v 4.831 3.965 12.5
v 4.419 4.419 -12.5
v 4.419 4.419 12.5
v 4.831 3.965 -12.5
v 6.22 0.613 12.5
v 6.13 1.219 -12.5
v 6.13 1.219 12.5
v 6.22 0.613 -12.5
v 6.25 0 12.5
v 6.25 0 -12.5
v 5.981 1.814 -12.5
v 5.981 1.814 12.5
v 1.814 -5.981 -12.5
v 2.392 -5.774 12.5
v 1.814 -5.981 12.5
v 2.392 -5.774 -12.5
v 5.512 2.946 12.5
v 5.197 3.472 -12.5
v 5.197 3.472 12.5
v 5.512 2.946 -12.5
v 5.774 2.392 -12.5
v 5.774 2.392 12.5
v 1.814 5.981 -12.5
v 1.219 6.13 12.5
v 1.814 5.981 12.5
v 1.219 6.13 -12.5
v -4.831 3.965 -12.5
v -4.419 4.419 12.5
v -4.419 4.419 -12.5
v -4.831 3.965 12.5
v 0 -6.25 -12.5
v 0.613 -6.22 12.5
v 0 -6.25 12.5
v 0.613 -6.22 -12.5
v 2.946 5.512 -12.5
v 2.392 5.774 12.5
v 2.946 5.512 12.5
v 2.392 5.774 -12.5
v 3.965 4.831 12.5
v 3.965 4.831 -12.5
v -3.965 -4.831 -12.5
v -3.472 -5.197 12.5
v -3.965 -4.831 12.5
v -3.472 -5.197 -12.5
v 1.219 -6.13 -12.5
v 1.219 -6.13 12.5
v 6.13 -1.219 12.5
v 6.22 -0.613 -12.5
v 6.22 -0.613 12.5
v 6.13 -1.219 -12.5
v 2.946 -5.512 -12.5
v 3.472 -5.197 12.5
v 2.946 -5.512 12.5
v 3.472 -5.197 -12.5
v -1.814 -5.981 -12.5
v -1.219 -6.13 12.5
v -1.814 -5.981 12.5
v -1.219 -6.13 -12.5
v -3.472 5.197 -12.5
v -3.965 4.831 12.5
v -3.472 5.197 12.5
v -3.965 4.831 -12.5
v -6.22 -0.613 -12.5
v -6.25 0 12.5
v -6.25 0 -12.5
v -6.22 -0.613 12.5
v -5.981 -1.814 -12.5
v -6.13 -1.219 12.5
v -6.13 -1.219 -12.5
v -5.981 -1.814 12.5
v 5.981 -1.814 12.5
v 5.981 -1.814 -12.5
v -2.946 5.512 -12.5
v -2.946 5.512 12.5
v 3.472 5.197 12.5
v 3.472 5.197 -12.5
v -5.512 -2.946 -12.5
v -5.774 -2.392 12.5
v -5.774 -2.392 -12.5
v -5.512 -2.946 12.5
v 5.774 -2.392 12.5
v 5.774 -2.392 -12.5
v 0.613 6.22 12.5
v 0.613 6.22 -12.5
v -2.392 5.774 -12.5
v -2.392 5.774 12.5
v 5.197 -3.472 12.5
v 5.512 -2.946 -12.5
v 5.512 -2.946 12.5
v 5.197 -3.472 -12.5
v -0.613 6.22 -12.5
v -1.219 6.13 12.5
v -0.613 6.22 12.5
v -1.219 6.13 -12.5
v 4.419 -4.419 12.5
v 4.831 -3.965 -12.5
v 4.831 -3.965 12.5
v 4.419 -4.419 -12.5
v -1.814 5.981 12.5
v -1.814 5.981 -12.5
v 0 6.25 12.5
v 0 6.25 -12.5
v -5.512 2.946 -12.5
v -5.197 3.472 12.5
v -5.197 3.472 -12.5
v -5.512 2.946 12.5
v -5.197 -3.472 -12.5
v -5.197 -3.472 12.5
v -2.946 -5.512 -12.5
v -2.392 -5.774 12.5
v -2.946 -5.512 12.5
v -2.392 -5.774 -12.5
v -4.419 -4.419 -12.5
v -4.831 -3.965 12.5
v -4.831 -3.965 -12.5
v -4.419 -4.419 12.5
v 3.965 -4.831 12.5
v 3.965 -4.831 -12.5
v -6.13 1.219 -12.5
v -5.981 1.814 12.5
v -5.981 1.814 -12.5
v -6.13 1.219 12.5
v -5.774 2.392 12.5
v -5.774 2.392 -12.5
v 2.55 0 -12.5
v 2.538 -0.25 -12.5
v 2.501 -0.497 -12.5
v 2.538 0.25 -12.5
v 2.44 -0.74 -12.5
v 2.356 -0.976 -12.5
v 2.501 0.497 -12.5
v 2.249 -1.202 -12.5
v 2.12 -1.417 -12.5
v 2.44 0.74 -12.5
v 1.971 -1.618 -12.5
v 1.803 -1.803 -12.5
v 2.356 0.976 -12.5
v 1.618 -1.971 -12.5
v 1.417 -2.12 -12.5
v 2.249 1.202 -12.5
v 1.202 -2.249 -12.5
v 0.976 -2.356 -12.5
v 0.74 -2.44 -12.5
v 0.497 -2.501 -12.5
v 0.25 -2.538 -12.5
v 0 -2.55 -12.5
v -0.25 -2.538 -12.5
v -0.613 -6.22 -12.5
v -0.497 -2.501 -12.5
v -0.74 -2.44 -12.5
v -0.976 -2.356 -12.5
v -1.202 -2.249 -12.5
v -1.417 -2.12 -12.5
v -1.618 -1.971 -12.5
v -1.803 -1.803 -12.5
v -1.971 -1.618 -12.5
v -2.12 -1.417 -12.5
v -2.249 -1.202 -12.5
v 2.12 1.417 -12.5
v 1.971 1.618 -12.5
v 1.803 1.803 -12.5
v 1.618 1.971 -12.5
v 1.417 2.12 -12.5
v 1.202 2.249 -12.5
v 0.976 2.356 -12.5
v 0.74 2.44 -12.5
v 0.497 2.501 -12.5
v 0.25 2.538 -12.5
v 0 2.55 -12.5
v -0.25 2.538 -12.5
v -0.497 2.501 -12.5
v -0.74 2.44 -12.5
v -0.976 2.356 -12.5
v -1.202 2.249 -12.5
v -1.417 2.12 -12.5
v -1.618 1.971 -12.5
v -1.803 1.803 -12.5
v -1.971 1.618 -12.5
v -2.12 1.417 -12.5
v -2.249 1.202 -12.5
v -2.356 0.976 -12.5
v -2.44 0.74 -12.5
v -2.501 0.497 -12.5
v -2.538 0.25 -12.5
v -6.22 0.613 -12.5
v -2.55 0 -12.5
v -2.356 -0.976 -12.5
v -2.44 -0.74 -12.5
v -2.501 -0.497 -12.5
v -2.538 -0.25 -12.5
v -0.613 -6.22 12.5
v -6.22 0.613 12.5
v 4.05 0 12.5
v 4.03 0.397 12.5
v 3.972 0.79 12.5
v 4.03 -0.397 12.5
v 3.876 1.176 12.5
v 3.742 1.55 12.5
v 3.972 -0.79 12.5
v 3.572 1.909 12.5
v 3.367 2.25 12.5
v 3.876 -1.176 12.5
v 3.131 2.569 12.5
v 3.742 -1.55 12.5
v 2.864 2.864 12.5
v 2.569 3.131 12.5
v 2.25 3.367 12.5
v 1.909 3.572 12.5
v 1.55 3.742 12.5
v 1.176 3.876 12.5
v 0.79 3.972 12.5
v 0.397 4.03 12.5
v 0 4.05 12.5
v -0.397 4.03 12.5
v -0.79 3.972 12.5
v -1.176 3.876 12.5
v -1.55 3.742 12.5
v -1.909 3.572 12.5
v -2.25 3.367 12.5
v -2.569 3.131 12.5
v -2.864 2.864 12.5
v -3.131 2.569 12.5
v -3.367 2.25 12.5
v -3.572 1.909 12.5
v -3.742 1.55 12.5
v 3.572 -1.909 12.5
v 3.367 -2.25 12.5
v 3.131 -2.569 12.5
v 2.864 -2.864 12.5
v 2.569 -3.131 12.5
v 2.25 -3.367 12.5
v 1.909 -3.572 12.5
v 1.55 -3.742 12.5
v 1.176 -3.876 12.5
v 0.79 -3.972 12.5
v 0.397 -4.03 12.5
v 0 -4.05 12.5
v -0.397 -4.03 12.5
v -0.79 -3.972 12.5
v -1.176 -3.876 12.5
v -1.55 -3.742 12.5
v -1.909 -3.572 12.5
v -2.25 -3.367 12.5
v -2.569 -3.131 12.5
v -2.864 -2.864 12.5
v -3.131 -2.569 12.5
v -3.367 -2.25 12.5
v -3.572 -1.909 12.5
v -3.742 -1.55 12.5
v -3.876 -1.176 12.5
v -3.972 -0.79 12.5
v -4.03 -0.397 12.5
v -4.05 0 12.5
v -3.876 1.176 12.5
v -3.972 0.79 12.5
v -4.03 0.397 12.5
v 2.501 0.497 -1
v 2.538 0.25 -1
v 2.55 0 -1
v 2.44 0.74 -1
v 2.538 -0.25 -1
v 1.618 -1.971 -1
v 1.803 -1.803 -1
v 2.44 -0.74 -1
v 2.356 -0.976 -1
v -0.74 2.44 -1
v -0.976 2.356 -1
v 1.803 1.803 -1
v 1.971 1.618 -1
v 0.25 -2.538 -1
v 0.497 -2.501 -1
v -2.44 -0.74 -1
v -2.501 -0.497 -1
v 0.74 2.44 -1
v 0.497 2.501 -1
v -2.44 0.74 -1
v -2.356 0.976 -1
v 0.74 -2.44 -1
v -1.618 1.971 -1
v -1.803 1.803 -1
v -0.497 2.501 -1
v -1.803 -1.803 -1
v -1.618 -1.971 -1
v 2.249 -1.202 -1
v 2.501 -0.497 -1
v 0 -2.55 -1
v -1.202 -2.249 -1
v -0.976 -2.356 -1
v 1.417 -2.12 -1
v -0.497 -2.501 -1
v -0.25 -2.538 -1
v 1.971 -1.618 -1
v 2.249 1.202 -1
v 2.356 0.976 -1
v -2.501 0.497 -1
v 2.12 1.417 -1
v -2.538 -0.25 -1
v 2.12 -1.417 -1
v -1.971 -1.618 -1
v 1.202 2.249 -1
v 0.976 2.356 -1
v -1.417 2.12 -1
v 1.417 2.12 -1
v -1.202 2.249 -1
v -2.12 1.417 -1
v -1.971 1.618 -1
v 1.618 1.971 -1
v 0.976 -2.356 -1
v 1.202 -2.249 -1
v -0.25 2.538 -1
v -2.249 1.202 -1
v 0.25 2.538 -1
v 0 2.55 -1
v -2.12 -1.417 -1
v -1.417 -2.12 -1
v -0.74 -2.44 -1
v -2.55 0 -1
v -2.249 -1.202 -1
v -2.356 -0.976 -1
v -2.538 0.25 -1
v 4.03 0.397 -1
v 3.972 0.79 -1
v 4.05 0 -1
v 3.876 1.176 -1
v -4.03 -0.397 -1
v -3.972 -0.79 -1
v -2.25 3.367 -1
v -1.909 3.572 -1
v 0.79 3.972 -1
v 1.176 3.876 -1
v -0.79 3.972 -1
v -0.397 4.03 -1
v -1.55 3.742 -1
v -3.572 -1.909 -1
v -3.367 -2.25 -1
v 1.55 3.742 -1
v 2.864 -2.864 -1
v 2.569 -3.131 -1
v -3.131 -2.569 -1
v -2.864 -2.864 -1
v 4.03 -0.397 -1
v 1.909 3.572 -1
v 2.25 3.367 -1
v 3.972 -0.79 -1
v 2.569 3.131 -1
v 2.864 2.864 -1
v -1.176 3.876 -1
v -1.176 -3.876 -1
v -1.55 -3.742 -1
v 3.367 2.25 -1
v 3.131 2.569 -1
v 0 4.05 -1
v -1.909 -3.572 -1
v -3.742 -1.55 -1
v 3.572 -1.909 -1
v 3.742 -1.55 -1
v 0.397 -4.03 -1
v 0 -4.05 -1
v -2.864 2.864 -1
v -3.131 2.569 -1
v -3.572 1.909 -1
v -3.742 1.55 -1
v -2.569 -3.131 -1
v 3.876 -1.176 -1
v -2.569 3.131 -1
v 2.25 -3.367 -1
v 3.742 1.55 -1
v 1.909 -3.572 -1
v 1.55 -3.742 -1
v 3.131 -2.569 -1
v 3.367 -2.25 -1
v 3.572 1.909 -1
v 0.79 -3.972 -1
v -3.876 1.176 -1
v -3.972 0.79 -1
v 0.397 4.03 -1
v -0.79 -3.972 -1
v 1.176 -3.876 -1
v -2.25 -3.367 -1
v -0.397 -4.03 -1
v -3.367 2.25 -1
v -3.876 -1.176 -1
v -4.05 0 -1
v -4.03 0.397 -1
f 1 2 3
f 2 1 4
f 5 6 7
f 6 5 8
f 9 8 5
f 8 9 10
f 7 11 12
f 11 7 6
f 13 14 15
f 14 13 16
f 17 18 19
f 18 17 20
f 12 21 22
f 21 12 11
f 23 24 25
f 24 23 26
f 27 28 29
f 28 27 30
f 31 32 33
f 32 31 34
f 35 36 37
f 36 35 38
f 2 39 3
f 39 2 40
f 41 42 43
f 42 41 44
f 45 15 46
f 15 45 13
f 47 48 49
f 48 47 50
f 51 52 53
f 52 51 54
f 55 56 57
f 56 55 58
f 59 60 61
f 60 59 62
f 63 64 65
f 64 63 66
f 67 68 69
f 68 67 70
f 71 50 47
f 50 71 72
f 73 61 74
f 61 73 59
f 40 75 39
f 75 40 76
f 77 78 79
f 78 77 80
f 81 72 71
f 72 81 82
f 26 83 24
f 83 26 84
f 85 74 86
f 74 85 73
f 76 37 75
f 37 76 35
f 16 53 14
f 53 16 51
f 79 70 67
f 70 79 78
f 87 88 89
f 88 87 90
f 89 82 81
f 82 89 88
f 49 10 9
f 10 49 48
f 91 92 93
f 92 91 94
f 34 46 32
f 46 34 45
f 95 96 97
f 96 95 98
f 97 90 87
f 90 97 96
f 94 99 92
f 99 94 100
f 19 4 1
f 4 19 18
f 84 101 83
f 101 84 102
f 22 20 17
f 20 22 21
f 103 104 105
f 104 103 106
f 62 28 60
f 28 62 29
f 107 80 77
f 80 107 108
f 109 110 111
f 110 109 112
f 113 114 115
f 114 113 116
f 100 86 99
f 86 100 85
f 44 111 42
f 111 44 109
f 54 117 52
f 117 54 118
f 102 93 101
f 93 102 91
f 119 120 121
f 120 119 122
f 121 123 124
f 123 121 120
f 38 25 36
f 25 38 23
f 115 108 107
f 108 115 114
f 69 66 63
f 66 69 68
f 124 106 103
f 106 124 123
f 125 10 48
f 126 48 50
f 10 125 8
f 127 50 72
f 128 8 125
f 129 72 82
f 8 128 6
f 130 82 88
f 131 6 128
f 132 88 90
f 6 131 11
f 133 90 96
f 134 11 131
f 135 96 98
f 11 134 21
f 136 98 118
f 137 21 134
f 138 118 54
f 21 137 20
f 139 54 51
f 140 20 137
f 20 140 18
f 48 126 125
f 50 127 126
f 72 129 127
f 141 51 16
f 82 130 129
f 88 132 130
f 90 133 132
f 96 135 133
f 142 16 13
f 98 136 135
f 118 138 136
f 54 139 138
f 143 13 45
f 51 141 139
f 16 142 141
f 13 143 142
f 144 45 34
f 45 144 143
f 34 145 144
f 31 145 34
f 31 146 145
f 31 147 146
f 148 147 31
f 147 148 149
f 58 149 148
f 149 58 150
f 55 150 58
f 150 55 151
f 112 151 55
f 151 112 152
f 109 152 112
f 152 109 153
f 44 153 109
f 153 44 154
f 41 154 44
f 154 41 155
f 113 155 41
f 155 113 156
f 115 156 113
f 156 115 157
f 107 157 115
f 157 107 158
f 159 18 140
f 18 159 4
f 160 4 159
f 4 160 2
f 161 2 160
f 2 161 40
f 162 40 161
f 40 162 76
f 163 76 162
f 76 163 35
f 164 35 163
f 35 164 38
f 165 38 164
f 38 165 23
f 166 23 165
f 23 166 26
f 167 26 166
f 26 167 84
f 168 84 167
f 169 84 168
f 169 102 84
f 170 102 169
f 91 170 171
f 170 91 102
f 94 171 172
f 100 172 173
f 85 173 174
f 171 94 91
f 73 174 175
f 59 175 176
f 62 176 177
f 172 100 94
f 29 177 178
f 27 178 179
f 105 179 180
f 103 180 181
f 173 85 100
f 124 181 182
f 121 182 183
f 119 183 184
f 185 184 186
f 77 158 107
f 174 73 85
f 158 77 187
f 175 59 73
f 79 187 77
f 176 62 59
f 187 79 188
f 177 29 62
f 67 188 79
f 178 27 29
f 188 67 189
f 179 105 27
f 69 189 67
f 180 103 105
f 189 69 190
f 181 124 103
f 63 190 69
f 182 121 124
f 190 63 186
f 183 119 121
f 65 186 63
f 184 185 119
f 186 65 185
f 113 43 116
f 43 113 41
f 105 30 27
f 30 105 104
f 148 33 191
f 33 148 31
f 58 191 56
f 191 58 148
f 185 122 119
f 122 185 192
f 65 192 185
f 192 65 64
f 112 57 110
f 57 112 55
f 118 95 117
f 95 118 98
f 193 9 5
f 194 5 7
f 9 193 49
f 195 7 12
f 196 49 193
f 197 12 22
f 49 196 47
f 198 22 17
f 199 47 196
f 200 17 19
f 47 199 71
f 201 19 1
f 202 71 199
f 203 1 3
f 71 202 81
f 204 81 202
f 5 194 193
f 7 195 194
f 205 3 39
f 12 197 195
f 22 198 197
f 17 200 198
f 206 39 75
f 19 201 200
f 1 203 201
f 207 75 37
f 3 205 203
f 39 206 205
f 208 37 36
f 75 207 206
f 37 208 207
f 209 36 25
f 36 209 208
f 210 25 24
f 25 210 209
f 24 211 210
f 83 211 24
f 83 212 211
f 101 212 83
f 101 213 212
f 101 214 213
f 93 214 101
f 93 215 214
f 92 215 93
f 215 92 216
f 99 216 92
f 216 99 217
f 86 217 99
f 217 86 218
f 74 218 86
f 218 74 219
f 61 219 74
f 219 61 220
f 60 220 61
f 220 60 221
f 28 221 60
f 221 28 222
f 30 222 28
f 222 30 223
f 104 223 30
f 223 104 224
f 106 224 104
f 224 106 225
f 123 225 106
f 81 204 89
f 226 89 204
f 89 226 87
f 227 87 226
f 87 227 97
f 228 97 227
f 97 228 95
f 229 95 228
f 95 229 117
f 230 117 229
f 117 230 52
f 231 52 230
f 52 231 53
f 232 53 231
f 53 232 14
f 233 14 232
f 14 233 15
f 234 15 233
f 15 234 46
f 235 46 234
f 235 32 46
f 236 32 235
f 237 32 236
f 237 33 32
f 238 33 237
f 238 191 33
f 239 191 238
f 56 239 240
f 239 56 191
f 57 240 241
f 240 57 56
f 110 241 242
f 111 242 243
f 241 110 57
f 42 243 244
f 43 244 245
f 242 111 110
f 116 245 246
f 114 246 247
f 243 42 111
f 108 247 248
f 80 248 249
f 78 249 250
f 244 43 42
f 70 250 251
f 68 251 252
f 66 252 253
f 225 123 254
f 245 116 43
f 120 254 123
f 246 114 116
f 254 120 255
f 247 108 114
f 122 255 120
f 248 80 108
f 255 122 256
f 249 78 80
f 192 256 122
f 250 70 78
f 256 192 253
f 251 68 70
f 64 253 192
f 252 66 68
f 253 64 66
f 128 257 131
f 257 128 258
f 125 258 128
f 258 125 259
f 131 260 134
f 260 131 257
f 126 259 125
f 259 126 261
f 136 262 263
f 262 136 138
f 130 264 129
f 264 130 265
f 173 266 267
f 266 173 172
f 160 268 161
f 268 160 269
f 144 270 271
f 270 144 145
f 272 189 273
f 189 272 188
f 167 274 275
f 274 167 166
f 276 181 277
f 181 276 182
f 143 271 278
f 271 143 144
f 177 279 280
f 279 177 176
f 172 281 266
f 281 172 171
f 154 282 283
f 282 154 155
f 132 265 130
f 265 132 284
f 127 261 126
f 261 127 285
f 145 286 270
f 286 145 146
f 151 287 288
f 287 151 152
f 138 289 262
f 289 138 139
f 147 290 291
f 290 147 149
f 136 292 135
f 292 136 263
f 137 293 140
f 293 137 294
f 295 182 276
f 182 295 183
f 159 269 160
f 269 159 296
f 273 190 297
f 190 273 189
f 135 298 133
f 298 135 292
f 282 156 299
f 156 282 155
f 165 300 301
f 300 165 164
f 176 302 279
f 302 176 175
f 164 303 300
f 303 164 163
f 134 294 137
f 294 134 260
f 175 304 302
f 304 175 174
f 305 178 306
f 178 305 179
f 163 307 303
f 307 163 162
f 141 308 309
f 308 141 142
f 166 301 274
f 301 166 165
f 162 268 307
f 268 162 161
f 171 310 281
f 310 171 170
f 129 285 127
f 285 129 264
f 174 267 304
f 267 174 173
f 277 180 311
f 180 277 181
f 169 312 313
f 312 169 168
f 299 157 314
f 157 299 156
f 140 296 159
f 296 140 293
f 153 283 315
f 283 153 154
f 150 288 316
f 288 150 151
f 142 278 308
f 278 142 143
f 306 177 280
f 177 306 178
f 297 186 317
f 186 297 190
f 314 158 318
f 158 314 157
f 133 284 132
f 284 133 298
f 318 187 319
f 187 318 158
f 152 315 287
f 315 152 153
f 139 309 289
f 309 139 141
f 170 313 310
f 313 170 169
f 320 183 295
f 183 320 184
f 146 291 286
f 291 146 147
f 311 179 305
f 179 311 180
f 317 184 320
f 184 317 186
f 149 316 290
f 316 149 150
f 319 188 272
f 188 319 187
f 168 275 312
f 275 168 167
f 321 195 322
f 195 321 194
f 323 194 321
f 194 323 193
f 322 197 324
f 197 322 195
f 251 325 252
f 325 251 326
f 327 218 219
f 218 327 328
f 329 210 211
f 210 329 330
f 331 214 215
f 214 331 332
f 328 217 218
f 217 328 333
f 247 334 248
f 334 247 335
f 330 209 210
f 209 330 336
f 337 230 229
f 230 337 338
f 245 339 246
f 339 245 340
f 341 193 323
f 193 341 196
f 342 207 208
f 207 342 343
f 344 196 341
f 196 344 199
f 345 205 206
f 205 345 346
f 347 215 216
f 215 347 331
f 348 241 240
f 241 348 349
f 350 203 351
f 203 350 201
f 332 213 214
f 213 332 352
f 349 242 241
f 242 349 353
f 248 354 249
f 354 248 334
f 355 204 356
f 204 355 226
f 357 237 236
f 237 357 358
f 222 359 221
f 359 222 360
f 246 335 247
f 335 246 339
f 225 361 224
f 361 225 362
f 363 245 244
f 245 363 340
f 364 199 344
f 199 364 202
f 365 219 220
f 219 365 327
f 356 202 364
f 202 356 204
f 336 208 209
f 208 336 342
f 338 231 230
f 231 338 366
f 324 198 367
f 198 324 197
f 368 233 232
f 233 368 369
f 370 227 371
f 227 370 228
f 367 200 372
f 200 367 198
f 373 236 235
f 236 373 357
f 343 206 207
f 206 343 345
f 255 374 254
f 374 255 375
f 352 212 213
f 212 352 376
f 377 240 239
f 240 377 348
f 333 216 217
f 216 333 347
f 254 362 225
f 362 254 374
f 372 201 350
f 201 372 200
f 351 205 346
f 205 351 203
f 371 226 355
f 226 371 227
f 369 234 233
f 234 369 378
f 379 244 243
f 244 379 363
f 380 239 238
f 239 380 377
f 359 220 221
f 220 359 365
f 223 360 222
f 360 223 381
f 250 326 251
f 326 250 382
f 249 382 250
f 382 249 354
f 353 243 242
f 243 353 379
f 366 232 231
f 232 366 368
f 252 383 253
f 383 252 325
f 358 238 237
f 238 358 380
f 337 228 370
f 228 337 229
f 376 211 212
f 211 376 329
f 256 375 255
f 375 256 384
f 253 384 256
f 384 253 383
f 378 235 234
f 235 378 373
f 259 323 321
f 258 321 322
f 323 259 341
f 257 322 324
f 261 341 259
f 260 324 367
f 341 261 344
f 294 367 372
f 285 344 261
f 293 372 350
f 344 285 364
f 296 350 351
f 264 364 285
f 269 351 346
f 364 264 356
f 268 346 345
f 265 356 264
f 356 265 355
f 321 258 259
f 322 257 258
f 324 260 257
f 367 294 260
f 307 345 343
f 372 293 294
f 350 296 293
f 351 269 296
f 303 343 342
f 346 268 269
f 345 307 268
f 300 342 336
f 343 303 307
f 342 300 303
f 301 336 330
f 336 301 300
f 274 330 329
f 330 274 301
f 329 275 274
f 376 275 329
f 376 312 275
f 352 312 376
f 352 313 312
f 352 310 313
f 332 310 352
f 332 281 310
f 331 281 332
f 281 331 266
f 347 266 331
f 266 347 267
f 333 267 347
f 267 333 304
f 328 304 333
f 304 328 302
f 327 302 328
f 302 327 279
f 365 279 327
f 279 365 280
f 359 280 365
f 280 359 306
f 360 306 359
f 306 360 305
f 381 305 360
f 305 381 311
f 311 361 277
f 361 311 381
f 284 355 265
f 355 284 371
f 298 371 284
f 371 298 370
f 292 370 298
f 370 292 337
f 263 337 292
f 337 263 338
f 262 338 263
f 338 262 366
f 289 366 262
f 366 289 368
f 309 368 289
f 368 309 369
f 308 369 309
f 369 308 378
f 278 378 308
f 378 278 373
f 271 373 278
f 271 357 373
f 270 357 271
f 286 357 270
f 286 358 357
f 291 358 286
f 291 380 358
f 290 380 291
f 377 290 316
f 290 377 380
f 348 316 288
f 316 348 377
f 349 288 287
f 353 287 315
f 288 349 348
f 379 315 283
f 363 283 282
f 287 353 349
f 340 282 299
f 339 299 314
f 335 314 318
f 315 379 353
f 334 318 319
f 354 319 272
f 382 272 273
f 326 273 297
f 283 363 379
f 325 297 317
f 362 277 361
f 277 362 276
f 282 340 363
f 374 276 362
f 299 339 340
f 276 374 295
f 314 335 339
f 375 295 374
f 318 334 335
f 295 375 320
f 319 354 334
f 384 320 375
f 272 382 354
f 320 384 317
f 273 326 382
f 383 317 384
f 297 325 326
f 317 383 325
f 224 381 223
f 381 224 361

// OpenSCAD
// Parameters
outer_diameter_mm = 12.5; //[6.25:25:0.1]
length_mm = 25; //[12.5:50:0.1]
bore1_diameter_mm = 5; //[2.5:10:0.05]
bore2_diameter_mm = 8; //[4:16:0.05]
bore_split_position_mm_from_end = 12.5; //[6.25:18.75:0.1]
tolerance_mm = 0.1; //[0:0.5:0.01]
set_screw_count_per_side = 0; //[0:4:1]
set_screw_hole_diameter_mm = 3; //[2:6:0.1]
set_screw_hole_depth_mm = 7; //[3:15:0.1]
set_screw_edge_offset_z_mm = 5; //[2:10:0.1]
overlap_mm = 1; //[0.5:2:0.1]

// Shaft Coupling - complete geometry
module shaft_coupling() {
  color("Silver") {
    difference() {
      // Coupling body
      translate([0, 0, 0])
        cylinder(r=outer_diameter_mm/2, h=length_mm, center=true, $fn=64);
      
      // Bore 5mm half
      translate([0, 0, -length_mm/2 + (bore_split_position_mm_from_end + overlap_mm)/2])
        cylinder(r=(bore1_diameter_mm + tolerance_mm)/2, h=bore_split_position_mm_from_end + overlap_mm, center=true, $fn=64);
      
      // Bore 8mm half
      translate([0, 0, -length_mm/2 + bore_split_position_mm_from_end + ((length_mm - bore_split_position_mm_from_end) + overlap_mm)/2 - overlap_mm])
        cylinder(r=(bore2_diameter_mm + tolerance_mm)/2, h=(length_mm - bore_split_position_mm_from_end) + overlap_mm, center=true, $fn=64);
      
      // Mid-plane bore transition
      translate([0, 0, -length_mm/2 + bore_split_position_mm_from_end])
        cylinder(r=(max(bore1_diameter_mm, bore2_diameter_mm) + tolerance_mm)/2, h=overlap_mm, center=true, $fn=64);
      
      // Set screw holes (optional)
      if (set_screw_count_per_side > 0) {
        union() {
          // Side 1
          for (i = [0 : set_screw_count_per_side - 1]) {
            rotate([0, 0, i * 360 / set_screw_count_per_side]) {
              translate([outer_diameter_mm/2 - set_screw_hole_depth_mm/2 + overlap_mm/2, 0, -length_mm/2 + set_screw_edge_offset_z_mm])
                rotate([0, 90, 0])
                cylinder(r=set_screw_hole_diameter_mm/2, h=set_screw_hole_depth_mm, center=true, $fn=32);
              
              translate([0, outer_diameter_mm/2 - set_screw_hole_depth_mm/2 + overlap_mm/2, -length_mm/2 + set_screw_edge_offset_z_mm])
                rotate([90, 0, 0])
                cylinder(r=set_screw_hole_diameter_mm/2, h=set_screw_hole_depth_mm, center=true, $fn=32);
            }
          }
          // Side 2
          for (i = [0 : set_screw_count_per_side - 1]) {
            rotate([0, 0, i * 360 / set_screw_count_per_side]) {
              translate([outer_diameter_mm/2 - set_screw_hole_depth_mm/2 + overlap_mm/2, 0, length_mm/2 - set_screw_edge_offset_z_mm])
                rotate([0, 90, 0])
                cylinder(r=set_screw_hole_diameter_mm/2, h=set_screw_hole_depth_mm, center=true, $fn=32);
              
              translate([0, outer_diameter_mm/2 - set_screw_hole_depth_mm/2 + overlap_mm/2, length_mm/2 - set_screw_edge_offset_z_mm])
                rotate([90, 0, 0])
                cylinder(r=set_screw_hole_diameter_mm/2, h=set_screw_hole_depth_mm, center=true, $fn=32);
            }
          }
        }
      }
    }
  }
}

// Assembly
module assembly() {
  shaft_coupling();
}

assembly();
